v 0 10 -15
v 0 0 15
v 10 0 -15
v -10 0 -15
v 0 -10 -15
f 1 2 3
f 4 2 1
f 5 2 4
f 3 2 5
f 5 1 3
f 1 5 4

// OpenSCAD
*cylinder(h=30, r=10);
*cylinder(h=30, r1=10, r2=0);
*cylinder(h=30, r1=10, r2=0, center=true);
cylinder(h=30, r1=10, r2=0, center=true, $fn=4);
